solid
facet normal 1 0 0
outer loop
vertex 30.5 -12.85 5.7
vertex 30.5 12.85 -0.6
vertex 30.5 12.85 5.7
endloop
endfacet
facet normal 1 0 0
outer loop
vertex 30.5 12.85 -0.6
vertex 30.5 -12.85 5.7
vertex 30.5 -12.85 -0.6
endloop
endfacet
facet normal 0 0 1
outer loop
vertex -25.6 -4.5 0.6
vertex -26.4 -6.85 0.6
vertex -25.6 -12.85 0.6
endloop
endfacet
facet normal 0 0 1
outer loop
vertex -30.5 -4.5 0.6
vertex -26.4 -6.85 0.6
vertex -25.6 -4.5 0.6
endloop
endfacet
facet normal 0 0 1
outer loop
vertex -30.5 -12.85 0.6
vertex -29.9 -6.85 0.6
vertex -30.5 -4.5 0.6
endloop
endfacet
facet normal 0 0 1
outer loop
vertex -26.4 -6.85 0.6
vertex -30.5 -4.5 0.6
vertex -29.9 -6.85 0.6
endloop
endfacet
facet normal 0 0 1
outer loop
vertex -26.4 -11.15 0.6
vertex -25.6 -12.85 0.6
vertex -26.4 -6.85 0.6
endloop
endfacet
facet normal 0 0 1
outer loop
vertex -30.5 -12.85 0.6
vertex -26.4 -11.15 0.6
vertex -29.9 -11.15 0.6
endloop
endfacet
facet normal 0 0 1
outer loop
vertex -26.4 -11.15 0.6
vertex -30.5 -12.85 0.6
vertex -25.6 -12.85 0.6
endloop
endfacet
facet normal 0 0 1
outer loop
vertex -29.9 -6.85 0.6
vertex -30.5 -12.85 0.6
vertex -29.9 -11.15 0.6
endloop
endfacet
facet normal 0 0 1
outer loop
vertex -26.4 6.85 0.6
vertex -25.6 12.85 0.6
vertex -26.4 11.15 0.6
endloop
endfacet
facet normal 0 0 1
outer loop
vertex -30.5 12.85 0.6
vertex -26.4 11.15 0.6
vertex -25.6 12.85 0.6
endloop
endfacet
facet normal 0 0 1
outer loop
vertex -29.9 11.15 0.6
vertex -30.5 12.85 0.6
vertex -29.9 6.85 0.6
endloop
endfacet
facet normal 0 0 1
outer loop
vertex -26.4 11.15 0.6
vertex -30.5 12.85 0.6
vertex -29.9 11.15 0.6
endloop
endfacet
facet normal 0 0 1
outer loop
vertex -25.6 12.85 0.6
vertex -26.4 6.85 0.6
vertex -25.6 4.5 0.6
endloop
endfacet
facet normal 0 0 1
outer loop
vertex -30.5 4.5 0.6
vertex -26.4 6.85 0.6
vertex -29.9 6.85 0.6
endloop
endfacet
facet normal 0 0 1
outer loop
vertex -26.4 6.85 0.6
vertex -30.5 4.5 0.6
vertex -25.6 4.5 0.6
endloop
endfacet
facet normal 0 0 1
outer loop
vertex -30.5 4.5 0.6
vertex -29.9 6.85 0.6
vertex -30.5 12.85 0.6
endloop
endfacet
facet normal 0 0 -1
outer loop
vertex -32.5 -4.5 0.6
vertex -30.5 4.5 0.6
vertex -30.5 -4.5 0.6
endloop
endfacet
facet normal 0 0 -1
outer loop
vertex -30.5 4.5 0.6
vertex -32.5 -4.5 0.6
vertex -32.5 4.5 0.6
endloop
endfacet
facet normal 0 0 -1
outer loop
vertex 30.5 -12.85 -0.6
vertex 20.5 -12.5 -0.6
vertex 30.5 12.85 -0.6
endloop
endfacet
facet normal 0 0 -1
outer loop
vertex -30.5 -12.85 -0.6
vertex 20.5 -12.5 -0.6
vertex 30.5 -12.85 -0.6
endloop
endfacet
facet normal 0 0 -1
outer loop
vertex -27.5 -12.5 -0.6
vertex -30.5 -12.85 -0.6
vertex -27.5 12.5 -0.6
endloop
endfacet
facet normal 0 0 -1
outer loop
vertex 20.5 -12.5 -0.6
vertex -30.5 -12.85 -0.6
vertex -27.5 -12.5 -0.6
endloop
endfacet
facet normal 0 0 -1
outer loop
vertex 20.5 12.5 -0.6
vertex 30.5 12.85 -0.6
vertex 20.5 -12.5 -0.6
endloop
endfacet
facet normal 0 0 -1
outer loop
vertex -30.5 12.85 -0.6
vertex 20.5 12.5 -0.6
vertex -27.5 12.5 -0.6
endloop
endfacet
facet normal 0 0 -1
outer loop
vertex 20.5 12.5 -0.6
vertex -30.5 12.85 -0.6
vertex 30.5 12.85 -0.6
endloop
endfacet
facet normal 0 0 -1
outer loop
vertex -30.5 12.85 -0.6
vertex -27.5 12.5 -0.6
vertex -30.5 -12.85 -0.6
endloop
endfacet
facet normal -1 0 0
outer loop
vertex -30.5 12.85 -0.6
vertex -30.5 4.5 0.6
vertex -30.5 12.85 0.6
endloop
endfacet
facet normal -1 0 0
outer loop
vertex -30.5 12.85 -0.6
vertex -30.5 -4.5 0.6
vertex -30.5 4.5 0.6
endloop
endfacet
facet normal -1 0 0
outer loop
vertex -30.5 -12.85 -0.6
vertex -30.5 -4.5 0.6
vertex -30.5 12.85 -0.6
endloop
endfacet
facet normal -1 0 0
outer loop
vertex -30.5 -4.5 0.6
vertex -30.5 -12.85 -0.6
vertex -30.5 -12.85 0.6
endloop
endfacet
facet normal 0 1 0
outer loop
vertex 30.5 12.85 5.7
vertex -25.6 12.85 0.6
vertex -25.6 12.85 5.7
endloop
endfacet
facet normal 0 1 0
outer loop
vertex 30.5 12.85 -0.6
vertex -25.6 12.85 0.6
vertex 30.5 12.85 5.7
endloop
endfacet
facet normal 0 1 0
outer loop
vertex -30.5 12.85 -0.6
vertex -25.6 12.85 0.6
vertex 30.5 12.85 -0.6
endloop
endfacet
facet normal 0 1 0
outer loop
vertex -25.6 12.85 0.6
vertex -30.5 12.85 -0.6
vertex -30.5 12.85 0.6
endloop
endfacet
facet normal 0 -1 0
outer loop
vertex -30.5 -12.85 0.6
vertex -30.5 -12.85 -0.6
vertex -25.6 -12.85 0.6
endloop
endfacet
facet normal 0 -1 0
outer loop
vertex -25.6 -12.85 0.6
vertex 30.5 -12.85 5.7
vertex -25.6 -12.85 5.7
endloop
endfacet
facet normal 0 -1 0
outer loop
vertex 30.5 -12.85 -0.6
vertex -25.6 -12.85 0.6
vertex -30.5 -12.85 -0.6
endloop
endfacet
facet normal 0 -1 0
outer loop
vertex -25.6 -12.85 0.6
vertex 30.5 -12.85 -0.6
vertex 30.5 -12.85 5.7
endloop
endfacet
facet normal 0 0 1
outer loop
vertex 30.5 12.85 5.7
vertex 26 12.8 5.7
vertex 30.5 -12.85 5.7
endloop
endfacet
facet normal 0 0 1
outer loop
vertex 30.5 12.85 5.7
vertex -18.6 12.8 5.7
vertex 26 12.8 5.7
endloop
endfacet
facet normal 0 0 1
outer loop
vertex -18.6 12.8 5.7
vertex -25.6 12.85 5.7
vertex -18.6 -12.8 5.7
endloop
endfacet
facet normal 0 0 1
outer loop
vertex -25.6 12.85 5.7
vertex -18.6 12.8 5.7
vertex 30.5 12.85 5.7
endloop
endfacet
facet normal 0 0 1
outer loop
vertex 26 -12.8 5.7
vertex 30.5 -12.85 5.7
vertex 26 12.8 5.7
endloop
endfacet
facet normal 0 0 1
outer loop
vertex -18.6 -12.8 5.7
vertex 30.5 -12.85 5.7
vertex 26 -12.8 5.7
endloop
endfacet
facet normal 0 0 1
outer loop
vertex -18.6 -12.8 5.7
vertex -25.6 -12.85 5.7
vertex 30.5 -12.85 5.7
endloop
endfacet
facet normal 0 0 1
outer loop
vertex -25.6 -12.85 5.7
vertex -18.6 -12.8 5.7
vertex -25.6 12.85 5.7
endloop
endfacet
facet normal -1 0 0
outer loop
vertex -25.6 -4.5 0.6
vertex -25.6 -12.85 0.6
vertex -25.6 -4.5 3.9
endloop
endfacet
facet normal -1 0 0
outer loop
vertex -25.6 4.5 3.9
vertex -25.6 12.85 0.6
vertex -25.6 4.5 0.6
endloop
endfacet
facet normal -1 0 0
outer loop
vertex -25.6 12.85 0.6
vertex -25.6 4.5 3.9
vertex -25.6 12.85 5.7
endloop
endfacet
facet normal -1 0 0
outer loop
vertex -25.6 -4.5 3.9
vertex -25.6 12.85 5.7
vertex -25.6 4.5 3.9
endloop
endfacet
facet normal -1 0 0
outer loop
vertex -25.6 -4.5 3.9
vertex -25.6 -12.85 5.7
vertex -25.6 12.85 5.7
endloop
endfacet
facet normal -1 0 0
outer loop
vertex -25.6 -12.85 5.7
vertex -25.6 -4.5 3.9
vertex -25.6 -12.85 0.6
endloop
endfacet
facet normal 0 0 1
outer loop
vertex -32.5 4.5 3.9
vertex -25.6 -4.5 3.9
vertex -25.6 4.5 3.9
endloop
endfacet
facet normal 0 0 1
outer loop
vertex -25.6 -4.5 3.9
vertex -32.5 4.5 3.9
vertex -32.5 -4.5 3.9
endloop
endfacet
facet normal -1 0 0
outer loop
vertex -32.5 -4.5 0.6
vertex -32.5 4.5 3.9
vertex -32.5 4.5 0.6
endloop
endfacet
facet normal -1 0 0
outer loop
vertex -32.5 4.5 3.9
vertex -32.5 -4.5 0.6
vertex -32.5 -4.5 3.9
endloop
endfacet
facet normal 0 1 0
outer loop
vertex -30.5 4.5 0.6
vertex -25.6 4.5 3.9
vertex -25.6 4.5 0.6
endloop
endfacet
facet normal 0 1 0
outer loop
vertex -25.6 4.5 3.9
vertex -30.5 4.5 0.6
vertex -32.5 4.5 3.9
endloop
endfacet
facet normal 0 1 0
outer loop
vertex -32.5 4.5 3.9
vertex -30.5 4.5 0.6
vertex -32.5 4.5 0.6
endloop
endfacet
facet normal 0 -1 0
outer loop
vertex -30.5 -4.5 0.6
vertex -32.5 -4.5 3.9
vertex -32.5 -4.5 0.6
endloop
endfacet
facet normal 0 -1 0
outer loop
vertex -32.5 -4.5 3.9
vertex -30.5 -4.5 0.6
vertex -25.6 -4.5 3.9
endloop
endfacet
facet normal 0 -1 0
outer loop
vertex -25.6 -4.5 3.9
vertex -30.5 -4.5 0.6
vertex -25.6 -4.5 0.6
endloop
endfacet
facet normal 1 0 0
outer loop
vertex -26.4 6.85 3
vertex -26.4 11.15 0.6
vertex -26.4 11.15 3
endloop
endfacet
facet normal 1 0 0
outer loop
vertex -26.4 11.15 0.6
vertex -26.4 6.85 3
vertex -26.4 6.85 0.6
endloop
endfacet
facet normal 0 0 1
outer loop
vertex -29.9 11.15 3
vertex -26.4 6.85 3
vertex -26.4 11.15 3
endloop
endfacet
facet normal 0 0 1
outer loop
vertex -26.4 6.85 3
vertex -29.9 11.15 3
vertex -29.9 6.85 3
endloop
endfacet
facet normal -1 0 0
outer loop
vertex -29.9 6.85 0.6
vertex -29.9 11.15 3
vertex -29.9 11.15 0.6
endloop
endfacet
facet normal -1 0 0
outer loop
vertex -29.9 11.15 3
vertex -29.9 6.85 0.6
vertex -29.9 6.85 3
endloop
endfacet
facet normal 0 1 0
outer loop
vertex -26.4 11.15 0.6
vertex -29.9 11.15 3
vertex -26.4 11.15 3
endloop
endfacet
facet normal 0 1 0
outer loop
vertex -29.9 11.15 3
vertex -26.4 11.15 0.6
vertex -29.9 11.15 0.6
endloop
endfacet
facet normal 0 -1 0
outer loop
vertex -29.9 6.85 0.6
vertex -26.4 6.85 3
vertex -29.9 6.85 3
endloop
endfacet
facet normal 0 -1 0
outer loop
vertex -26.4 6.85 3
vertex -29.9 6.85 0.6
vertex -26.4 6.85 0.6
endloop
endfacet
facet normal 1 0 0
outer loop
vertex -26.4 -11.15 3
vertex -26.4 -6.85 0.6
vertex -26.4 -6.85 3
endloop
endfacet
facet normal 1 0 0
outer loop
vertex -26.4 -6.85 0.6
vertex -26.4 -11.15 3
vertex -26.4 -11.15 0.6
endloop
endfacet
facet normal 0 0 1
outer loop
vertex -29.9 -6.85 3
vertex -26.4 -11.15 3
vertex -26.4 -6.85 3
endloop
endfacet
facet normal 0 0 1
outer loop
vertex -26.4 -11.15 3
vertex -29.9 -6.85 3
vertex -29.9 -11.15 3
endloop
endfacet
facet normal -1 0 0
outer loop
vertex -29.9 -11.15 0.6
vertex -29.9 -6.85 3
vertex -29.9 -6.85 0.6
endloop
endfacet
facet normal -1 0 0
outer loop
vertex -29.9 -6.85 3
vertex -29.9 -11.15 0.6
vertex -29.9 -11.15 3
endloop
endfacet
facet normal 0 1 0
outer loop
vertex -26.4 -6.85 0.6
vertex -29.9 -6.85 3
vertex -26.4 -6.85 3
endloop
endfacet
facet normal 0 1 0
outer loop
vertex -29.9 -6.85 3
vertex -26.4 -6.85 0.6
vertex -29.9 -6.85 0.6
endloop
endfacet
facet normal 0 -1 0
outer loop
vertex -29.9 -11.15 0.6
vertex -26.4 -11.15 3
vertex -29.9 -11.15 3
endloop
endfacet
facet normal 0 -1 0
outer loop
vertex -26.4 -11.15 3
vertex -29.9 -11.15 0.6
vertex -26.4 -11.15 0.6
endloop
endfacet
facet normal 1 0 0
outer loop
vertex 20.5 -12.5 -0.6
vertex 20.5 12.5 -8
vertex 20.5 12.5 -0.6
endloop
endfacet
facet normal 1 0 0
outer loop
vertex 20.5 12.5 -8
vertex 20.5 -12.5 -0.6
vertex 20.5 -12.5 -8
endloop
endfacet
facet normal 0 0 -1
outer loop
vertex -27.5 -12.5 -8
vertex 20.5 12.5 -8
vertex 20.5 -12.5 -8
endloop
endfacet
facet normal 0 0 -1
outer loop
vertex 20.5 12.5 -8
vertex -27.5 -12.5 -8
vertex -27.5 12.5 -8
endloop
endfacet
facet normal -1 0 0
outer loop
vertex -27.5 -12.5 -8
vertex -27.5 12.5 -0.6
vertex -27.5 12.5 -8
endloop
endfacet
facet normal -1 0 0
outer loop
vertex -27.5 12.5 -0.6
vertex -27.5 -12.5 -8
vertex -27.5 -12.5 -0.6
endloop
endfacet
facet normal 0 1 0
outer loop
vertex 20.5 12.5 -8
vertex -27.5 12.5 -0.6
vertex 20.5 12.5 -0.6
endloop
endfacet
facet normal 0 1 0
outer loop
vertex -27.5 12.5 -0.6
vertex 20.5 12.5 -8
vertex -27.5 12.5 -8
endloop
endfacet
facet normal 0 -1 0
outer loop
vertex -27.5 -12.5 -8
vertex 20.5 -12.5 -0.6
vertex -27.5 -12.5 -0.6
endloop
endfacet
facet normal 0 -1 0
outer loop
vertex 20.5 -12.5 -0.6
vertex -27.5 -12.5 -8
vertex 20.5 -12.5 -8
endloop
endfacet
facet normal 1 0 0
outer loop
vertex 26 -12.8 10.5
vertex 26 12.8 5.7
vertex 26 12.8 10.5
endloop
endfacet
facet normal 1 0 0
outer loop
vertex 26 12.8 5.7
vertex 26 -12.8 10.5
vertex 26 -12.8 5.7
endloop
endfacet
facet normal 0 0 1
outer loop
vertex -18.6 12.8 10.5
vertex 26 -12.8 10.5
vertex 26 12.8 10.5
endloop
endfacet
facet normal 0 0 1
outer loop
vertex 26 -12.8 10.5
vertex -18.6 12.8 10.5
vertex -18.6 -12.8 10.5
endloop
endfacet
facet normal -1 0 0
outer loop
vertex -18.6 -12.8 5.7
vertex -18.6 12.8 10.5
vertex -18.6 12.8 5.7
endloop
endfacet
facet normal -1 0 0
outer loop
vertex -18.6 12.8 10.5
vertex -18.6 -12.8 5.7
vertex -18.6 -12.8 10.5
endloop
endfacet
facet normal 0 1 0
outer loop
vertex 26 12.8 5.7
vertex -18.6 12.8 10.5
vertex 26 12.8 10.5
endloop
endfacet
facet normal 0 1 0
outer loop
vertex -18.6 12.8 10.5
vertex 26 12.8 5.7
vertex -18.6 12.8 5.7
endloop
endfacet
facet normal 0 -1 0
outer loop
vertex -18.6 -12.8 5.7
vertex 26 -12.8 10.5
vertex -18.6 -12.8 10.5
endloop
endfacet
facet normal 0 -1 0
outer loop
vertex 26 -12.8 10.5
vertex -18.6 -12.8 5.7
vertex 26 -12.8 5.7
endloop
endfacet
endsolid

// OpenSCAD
module esp32_lilygo_t_display_s3() {
    pcb= [61.0,25.7,1.2];
    disp=[56.1,25.7,5.1];
    
    usb=[9,9,3.3]; 
    
    bt=[3.5,4.3,2.4];
    rst=[2,2,1];    
    
    union() {       
      // PCB
      cube(pcb, center=true);           
      // screen        
      translate([(pcb[0]-disp[0])/2,0,(pcb[2]+disp[2])/2])
        cube(disp, center=true);           
        
      // USB
      translate([-(pcb[0]-usb[0])/2-2,0,(pcb[2]+usb[2])/2])
        cube(usb, center=true);    
         
      // buttons
      translate([-(pcb[0]-bt[0])/2+0.6,+9,(pcb[2]+bt[2])/2])        
        cube(bt, center=true);    
      translate([-(pcb[0]-bt[0])/2+0.6,-9,(pcb[2]+bt[2])/2])        
        cube(bt, center=true);    
        /*
      // reset button
      translate([-pcb[0]/2+12,-pcb[1]/2,(pcb[2]+rst[2]+1)/2])
        cube(rst, center=true);    
      translate([-pcb[0]/2+12,-pcb[1]/2+1,pcb[2]/2+1])
        cube([4,2,2], center=true);    
      */
      // safe sapce
      translate([-3.5,0,-4])
        cube([48,25,8], center=true);    
    }
}

module esp32_lilygo_t_display_s3_view() {
  pcb= [61.0,25.7,1.2];
  dispv=[56.1-7-4.5,25.6,10]; // visible
  translate([(pcb[0]-dispv[0])/2-4.5,0,5.5])
    cube(dispv, center=true);   
}



color("#30AA30")
rotate([0,0,0])
  esp32_lilygo_t_display_s3();    
color("#30AAAA")
rotate([0,0,0])
  esp32_lilygo_t_display_s3_view();
